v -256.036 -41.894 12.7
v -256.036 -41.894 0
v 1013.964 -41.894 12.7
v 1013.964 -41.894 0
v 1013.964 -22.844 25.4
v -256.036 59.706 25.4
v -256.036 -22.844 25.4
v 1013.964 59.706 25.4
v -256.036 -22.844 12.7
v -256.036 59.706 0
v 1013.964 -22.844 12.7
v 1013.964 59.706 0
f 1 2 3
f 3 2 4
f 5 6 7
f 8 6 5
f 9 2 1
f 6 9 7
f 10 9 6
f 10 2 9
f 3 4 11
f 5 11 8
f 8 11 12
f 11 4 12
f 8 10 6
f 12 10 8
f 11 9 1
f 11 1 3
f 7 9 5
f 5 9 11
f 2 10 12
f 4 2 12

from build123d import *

# Parameters (mm, degrees)
F0_W      = 1270
F0_H      = 82.55
F1_DEPTH  = 12.7
F0_H_2    = 19.05
F1_FACE_W = 1270
F1_FACE_H = 82.55
F2_DEPTH  = 12.7


with BuildPart() as f1:
    # F0 (on Top) → F1 (new body)
    with BuildSketch(Plane.XY):
        with Locations((378.964252, 18.430763)):
            Rectangle(F0_W, F0_H)
    extrude(amount=F1_DEPTH)

    # F0 (on Top) + F1_face (on face) → F2 (join)
    with BuildSketch(Plane.XY):
        with Locations((378.964252, 18.430763)):
            Rectangle(F0_W, F0_H)
        with Locations((378.964252, -32.369237)):
            Rectangle(F0_W, F0_H_2)
    with BuildSketch(Plane(origin=(378.964252, 18.430763, 12.7), x_dir=(1, 0, 0), z_dir=(0, 0, 1))):
        Rectangle(F1_FACE_W, F1_FACE_H)
    extrude(amount=F2_DEPTH)


solid = f1.part
